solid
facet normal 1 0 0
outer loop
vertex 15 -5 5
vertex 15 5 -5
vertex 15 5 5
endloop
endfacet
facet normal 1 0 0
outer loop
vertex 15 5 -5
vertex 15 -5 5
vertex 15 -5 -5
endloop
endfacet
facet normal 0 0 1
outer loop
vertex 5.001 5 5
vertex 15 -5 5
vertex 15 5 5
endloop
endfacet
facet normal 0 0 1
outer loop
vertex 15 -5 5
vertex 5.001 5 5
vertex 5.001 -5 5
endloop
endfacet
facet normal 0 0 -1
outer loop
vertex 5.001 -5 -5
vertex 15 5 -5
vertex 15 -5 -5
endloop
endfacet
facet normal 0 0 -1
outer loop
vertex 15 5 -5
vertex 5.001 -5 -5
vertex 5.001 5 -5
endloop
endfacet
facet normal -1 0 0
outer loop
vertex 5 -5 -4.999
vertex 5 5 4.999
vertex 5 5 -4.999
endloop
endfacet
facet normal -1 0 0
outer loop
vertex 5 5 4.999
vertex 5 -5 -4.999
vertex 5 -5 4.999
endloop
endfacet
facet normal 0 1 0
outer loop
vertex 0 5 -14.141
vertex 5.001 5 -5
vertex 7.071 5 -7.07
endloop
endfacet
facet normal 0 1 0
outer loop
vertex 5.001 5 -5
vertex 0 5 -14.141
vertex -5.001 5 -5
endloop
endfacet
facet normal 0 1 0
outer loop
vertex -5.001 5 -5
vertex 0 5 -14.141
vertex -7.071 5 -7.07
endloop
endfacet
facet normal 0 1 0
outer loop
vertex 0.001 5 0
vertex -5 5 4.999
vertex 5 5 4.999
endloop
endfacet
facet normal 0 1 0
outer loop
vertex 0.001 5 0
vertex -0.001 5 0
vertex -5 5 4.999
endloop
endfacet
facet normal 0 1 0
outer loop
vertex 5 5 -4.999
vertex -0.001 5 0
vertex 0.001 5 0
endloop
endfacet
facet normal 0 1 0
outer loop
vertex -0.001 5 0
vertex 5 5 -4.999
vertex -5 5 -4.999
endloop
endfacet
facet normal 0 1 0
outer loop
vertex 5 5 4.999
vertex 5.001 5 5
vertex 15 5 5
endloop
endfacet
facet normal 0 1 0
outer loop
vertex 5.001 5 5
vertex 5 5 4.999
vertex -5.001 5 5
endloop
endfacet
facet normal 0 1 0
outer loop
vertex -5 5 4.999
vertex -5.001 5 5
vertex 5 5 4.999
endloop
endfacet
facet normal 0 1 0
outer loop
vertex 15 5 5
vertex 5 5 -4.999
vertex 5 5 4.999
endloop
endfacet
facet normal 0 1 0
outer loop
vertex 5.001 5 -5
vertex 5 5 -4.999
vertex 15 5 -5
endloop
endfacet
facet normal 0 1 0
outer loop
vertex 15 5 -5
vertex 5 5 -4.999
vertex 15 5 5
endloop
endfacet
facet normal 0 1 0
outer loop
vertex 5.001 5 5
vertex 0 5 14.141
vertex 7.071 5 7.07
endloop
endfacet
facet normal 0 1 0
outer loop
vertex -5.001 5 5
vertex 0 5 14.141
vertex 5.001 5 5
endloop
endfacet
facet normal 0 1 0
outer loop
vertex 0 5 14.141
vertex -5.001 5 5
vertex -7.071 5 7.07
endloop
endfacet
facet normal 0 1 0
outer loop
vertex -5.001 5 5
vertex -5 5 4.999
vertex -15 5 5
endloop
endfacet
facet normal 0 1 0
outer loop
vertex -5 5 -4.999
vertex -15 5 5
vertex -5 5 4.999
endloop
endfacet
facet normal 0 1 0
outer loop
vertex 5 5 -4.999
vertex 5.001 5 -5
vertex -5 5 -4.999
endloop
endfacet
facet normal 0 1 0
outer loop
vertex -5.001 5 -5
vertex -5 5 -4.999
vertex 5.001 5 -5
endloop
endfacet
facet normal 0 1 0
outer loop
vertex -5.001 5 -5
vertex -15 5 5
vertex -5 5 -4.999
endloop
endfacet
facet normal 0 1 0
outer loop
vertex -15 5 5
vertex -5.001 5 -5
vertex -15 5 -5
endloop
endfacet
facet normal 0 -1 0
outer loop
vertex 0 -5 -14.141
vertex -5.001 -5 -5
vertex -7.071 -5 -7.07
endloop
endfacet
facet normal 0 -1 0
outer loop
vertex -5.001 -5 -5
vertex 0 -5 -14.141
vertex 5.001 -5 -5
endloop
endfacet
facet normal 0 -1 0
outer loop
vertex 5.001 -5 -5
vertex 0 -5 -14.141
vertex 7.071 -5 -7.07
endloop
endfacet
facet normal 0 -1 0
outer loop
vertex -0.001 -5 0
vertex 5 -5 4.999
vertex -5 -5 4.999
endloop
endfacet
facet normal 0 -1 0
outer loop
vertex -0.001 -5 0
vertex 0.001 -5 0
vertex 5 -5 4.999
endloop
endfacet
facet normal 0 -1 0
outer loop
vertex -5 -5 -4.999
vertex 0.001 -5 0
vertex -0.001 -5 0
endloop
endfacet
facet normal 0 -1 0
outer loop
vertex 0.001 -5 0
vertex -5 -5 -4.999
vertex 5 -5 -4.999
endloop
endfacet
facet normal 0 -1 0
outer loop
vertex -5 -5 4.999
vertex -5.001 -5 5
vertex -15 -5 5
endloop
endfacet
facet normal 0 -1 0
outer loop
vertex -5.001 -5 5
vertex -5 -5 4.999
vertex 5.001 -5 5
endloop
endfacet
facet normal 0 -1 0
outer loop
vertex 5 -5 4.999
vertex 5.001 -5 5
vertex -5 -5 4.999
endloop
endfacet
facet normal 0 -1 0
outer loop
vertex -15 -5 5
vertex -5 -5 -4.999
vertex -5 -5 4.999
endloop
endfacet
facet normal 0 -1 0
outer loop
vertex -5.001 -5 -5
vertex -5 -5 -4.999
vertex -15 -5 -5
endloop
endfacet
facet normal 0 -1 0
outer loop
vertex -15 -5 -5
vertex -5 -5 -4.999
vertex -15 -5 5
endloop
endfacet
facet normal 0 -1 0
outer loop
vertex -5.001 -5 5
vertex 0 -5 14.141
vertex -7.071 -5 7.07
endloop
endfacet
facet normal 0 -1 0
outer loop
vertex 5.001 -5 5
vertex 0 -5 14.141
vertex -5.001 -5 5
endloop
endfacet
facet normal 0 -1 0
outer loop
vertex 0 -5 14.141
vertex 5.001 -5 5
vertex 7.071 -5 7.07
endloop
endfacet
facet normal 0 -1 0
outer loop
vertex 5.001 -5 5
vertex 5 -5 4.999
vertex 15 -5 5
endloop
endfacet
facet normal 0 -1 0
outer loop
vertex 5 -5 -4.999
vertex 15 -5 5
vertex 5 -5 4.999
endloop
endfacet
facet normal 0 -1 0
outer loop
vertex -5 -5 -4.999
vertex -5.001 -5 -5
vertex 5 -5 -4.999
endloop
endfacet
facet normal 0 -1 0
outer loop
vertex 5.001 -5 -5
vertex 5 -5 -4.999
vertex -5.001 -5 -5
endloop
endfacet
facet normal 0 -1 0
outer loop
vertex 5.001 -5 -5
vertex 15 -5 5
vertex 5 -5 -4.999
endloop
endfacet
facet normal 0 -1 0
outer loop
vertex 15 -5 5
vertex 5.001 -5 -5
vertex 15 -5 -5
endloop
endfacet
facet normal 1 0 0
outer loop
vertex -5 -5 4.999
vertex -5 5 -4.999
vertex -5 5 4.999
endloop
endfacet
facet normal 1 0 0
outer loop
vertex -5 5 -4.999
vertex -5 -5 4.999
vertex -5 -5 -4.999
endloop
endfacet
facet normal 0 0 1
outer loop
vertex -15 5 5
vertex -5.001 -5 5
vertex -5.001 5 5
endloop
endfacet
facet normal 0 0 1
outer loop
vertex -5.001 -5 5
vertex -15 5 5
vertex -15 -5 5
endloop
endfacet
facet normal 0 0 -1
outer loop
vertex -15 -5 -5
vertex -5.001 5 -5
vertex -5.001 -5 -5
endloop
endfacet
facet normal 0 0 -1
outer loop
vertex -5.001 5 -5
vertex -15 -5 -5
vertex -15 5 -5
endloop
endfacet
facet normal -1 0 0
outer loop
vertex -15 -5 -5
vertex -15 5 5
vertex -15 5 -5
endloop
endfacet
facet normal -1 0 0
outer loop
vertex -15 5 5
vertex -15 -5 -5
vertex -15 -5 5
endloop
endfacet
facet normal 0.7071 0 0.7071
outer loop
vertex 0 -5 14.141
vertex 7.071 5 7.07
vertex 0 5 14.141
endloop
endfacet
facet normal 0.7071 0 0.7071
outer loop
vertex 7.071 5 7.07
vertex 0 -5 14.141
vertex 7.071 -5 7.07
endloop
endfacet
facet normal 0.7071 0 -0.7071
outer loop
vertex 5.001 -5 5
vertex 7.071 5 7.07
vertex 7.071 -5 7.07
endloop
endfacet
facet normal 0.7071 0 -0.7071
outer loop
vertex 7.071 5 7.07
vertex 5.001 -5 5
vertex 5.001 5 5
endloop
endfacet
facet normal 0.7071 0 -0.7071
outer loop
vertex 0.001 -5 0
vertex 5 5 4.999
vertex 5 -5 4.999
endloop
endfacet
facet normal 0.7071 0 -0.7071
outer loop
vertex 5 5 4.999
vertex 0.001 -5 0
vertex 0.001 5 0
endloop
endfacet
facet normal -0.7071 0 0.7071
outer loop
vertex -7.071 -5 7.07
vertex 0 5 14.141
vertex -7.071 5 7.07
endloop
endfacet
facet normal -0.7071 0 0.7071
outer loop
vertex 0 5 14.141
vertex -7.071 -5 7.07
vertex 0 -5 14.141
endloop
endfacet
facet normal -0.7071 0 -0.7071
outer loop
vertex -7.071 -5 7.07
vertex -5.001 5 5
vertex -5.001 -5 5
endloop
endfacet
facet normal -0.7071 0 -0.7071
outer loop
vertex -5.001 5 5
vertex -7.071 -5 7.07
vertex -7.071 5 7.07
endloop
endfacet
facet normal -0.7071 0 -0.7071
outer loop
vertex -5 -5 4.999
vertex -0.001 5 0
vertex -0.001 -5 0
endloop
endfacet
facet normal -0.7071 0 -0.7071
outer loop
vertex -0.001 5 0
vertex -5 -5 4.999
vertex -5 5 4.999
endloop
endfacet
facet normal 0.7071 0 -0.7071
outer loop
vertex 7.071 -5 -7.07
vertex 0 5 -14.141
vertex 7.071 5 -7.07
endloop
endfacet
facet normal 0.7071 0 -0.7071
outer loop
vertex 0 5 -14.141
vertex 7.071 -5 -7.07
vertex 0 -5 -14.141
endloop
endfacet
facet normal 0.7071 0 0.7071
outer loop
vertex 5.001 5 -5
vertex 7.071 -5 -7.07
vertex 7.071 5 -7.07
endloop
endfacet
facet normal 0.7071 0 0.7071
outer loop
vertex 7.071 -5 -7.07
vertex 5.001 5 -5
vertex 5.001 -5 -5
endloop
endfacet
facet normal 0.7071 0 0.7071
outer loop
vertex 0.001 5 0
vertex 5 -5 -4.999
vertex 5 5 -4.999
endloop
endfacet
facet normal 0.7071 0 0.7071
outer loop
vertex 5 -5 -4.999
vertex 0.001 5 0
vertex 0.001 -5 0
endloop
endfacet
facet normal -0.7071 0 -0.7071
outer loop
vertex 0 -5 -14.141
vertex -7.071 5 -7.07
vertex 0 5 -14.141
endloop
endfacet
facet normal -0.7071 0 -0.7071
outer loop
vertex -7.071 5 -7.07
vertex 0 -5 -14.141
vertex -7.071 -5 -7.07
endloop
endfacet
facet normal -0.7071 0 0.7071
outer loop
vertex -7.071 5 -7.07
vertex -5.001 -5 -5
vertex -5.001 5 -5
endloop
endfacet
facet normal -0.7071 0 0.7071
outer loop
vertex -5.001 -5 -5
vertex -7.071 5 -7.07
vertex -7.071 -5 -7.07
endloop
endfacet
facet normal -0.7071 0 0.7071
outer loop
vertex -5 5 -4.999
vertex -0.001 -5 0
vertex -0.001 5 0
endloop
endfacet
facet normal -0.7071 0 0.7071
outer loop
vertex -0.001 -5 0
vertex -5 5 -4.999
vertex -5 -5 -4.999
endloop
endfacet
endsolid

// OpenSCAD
module move(x=0,y=0,z=0,rx=0,ry=0,rz=0)
{ translate([x,y,z])rotate([rx,ry,rz]) children(); }
   
move(10)           cube(10,true);
move(-10)          cube(10,true);
move(z=7.07, ry=45)cube(10,true);
move(z=-7.07,ry=45)cube(10,true);
